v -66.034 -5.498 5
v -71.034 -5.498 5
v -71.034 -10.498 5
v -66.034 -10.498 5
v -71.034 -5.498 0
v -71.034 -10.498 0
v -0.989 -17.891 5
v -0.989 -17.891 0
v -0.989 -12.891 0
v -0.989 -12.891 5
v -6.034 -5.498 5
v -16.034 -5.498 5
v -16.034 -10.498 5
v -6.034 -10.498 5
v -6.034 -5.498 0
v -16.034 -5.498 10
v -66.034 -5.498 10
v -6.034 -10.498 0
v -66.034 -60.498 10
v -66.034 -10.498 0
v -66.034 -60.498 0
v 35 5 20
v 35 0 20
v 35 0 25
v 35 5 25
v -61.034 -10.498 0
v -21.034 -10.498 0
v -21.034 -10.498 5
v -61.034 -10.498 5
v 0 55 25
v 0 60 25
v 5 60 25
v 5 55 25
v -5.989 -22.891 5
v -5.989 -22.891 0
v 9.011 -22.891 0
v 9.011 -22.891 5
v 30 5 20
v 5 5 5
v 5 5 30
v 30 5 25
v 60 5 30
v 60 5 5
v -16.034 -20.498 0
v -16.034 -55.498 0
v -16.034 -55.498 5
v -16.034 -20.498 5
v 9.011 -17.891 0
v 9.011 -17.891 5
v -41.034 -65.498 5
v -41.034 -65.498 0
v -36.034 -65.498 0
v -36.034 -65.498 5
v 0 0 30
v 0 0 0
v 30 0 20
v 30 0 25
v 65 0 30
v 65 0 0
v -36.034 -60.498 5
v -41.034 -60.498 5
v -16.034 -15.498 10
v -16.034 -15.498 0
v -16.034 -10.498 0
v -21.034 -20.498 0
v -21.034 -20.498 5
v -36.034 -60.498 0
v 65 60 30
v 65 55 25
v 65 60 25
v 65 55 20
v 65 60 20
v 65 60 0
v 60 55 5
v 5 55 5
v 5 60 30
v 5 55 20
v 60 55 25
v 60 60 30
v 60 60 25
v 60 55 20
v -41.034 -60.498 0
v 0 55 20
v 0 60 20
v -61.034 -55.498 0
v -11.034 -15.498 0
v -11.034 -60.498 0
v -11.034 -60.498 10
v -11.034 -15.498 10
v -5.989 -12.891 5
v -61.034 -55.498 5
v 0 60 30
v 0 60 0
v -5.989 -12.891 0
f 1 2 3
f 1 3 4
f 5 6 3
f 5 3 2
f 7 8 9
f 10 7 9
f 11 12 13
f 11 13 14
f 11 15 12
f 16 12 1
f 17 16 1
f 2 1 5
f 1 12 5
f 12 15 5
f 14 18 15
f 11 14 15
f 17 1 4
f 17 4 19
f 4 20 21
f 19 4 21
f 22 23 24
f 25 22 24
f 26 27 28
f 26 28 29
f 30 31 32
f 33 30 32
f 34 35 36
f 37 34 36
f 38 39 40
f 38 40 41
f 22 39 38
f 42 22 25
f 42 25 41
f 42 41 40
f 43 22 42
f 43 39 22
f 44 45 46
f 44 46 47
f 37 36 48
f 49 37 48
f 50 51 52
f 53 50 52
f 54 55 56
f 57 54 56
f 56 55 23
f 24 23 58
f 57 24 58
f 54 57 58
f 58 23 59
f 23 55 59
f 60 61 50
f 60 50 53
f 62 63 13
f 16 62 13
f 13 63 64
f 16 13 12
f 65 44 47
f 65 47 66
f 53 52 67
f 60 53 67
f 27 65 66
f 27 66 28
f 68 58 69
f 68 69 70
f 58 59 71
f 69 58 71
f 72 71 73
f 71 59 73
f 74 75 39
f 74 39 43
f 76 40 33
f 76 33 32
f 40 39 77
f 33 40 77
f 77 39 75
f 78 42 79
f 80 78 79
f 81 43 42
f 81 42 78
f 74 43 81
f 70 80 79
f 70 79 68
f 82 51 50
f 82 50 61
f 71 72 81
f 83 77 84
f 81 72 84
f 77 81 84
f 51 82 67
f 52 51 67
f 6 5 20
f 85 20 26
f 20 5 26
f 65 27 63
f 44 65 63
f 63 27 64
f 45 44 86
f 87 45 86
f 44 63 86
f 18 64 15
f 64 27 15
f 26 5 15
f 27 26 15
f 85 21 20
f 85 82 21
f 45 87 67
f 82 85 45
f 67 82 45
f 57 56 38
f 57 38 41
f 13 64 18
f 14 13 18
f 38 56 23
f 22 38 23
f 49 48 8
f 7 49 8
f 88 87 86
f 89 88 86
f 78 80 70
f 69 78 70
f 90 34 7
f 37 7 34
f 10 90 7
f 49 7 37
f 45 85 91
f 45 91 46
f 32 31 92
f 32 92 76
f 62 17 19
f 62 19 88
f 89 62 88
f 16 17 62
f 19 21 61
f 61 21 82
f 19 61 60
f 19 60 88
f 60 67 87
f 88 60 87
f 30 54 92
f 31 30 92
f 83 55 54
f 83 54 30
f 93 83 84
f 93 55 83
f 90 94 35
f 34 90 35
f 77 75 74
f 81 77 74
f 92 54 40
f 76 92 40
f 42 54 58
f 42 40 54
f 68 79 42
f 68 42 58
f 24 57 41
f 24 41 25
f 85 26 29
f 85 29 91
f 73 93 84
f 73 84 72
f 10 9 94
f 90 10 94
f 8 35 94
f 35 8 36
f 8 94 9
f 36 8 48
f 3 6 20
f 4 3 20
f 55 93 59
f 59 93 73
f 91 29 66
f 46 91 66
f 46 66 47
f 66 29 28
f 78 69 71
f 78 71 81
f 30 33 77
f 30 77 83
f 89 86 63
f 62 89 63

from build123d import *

# Parameters (mm, degrees)
F5_W      = 55
F5_H      = 50
F6_DEPTH  = 5
F5_W_2    = 65
F5_H_2    = 60
F7_DEPTH  = 30
F9_DEPTH  = 5
F10_DEPTH = 10
F11_DEPTH = 5
F5_W_3    = 10
F5_H_3    = 5
F5_W_4    = 5
F12_DEPTH = 5
F13_W     = 5
F13_H     = 5
F14_DEPTH = 5
F15_DEPTH = 5


with BuildPart() as f6:
    # F5 (on Top) → F6 (new body)
    with BuildSketch(Plane.XY):
        with Locations((32.5, 30)):
            Rectangle(F5_W, F5_H)
    extrude(amount=F6_DEPTH)

    # F5 (on Top) → F7 (join)
    with BuildSketch(Plane.XY):
        with Locations((32.5, 30)):
            Rectangle(F5_W_2, F5_H_2)
        with Locations((32.5, 30)):
            Rectangle(F5_W, F5_H, mode=Mode.SUBTRACT)
    extrude(amount=F7_DEPTH)

    # F8 (on face) → F9 (cut)
    with BuildSketch(Plane(origin=(0, 60, 0), x_dir=(-1, 0, 0), z_dir=(0, 1, 0))):
        Polygon((-60, 25), (-65, 25), (-65, 20), (0, 20), (0, 25), (-5, 25), (-5, 30), (-60, 30), align=None)
    extrude(amount=-F9_DEPTH, mode=Mode.SUBTRACT)

    # F13 (on face) → F14 (cut, through all)
    with BuildSketch(Plane.XZ):
        with Locations((32.5, 22.5)):
            Rectangle(F13_W, F13_H)
    extrude(amount=-F14_DEPTH, mode=Mode.SUBTRACT)


with BuildPart() as f10:
    # F5 (on Top) → F10 (new body)
    with BuildSketch(Plane.XY):
        Polygon((-16.0336927418, -5.4975085858), (-66.0336927418, -5.4975085858), (-66.0336927418, -10.4975085858), (-66.0336927418, -60.4975085858), (-41.0336927418, -60.4975085858), (-36.0336927418, -60.4975085858), (-11.0336927418, -60.4975085858), (-11.0336927418, -15.4975085858), (-16.0336927418, -15.4975085858), (-16.0336927418, -10.4975085858), align=None)
        Polygon((-61.0336927418, -55.4975085858), (-61.0336927418, -10.4975085858), (-21.0336927418, -10.4975085858), (-21.0336927418, -20.4975085858), (-16.0336927418, -20.4975085858), (-16.0336927418, -55.4975085858), align=None, mode=Mode.SUBTRACT)
        Polygon((-21.0336927418, -10.4975085858), (-61.0336927418, -10.4975085858), (-61.0336927418, -55.4975085858), (-16.0336927418, -55.4975085858), (-16.0336927418, -20.4975085858), (-21.0336927418, -20.4975085858), align=None)
    extrude(amount=F10_DEPTH)

    # F5 (on Top) → F11 (cut)
    with BuildSketch(Plane.XY):
        Polygon((-21.0336927418, -10.4975085858), (-61.0336927418, -10.4975085858), (-61.0336927418, -55.4975085858), (-16.0336927418, -55.4975085858), (-16.0336927418, -20.4975085858), (-21.0336927418, -20.4975085858), align=None)
    extrude(amount=F11_DEPTH, mode=Mode.SUBTRACT)

    # F5 (on Top) → F12 (join)
    with BuildSketch(Plane.XY):
        with Locations((-11.0336927418, -7.9975085858)):
            Rectangle(F5_W_3, F5_H_3)
        with Locations((-38.5336927418, -62.9975085858)):
            Rectangle(F5_W_4, F5_H_3)
        with Locations((-68.5336927418, -7.9975085858)):
            Rectangle(F5_W_4, F5_H_3)
    extrude(amount=F12_DEPTH)


with BuildPart() as f15:
    # F5 (on Top) → F15 (new body)
    with BuildSketch(Plane.XY):
        Polygon((-5.9894532897, -12.8913407773), (-5.9894532897, -22.8913407773), (9.0105467103, -22.8913407773), (9.0105467103, -17.8913407773), (-0.9894532897, -17.8913407773), (-0.9894532897, -12.8913407773), align=None)
    extrude(amount=F15_DEPTH)


solid = Compound([f6.part, f10.part, f15.part])
